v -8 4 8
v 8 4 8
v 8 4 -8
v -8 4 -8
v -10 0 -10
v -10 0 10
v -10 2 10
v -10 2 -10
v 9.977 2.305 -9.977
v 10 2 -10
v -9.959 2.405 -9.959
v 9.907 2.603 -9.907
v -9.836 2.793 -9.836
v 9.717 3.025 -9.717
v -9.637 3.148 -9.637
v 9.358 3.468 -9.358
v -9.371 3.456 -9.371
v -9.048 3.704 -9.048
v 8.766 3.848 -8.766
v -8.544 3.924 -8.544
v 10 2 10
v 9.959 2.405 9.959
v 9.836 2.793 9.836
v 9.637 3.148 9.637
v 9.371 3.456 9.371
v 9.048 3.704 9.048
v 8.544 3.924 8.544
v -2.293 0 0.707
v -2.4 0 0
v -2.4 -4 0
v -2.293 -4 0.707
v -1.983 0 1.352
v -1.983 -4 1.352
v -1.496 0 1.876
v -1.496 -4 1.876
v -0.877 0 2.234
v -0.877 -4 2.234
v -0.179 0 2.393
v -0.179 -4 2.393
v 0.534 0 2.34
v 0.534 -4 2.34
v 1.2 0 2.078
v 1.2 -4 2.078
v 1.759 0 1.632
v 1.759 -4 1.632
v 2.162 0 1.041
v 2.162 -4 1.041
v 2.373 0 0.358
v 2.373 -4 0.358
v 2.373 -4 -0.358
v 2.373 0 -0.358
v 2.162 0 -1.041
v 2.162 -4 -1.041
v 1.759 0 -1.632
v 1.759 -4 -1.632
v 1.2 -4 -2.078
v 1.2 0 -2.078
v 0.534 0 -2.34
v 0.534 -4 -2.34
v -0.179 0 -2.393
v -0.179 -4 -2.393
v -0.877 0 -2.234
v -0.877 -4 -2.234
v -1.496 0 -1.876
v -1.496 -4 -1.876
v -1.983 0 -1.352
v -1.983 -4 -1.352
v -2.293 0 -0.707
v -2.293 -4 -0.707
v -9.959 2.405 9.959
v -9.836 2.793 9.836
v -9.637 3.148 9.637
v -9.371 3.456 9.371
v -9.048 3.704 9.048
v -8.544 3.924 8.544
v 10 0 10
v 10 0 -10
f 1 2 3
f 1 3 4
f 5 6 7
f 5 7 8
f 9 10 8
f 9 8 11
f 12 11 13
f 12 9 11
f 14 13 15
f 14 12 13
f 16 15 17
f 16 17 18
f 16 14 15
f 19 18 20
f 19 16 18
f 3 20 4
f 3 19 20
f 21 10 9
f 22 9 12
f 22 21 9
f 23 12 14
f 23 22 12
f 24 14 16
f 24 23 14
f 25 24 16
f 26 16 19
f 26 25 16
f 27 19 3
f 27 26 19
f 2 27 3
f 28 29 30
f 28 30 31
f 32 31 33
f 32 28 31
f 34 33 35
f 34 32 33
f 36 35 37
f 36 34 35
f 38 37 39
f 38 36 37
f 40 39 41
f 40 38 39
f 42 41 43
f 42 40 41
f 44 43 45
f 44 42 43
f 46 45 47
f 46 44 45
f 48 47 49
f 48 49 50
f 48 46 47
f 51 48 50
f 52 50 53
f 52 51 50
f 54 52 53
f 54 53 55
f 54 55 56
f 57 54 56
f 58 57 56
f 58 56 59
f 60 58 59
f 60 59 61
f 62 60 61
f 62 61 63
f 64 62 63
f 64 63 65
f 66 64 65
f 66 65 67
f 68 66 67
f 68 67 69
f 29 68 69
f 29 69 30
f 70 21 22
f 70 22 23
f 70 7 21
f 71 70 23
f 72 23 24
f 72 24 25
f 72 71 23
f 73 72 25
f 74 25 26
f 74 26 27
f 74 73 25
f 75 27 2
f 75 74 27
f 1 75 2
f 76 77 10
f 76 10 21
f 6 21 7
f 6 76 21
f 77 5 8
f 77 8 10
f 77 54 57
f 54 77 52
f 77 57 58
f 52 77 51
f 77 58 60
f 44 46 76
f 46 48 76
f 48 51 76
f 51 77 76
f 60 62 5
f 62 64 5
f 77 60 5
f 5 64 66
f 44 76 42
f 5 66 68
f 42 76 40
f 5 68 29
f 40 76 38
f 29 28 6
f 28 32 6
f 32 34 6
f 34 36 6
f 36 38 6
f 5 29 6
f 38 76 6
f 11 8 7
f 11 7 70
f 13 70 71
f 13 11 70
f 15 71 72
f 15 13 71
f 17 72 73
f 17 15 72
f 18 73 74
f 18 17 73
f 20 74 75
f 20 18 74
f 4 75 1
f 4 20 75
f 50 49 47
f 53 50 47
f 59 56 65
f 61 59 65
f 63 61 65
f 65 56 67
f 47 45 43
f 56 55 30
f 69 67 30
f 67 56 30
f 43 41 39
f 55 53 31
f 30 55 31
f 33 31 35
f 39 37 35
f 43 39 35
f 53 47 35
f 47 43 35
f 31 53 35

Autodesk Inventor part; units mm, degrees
sketch "Sketch1" plane through (0, 0, 0) normal (0, 1, 0) x (-1, 0, 0)
  line L0 (-10, 10) -> (10, 10)
  line L1 (10, 10) -> (10, -10)
  line L2 (10, -10) -> (-10, -10)
  line L3 (-10, -10) -> (-10, 10)
  line L4 (-10, 10) -> (10, -10) construction
  line L5 (10, 10) -> (-10, -10) construction
  circle A0 centre (0, 0) radius 2.4
  dimension "d0" = 20
  dimension "d3" = 4.8
extrude "Extrusion1" add sketch "Sketch1" along normal mid plane 8 contours A0
extrude "Extrusion2" add sketch "Sketch1" along normal blind 4
fillet "Fillet1" radius 2 4 edges at (-10, 4, 0) (0, 4, -10) (10, 4, 0) (0, 4, 10)
properties part number "tampa_001_001_3DPrint"
